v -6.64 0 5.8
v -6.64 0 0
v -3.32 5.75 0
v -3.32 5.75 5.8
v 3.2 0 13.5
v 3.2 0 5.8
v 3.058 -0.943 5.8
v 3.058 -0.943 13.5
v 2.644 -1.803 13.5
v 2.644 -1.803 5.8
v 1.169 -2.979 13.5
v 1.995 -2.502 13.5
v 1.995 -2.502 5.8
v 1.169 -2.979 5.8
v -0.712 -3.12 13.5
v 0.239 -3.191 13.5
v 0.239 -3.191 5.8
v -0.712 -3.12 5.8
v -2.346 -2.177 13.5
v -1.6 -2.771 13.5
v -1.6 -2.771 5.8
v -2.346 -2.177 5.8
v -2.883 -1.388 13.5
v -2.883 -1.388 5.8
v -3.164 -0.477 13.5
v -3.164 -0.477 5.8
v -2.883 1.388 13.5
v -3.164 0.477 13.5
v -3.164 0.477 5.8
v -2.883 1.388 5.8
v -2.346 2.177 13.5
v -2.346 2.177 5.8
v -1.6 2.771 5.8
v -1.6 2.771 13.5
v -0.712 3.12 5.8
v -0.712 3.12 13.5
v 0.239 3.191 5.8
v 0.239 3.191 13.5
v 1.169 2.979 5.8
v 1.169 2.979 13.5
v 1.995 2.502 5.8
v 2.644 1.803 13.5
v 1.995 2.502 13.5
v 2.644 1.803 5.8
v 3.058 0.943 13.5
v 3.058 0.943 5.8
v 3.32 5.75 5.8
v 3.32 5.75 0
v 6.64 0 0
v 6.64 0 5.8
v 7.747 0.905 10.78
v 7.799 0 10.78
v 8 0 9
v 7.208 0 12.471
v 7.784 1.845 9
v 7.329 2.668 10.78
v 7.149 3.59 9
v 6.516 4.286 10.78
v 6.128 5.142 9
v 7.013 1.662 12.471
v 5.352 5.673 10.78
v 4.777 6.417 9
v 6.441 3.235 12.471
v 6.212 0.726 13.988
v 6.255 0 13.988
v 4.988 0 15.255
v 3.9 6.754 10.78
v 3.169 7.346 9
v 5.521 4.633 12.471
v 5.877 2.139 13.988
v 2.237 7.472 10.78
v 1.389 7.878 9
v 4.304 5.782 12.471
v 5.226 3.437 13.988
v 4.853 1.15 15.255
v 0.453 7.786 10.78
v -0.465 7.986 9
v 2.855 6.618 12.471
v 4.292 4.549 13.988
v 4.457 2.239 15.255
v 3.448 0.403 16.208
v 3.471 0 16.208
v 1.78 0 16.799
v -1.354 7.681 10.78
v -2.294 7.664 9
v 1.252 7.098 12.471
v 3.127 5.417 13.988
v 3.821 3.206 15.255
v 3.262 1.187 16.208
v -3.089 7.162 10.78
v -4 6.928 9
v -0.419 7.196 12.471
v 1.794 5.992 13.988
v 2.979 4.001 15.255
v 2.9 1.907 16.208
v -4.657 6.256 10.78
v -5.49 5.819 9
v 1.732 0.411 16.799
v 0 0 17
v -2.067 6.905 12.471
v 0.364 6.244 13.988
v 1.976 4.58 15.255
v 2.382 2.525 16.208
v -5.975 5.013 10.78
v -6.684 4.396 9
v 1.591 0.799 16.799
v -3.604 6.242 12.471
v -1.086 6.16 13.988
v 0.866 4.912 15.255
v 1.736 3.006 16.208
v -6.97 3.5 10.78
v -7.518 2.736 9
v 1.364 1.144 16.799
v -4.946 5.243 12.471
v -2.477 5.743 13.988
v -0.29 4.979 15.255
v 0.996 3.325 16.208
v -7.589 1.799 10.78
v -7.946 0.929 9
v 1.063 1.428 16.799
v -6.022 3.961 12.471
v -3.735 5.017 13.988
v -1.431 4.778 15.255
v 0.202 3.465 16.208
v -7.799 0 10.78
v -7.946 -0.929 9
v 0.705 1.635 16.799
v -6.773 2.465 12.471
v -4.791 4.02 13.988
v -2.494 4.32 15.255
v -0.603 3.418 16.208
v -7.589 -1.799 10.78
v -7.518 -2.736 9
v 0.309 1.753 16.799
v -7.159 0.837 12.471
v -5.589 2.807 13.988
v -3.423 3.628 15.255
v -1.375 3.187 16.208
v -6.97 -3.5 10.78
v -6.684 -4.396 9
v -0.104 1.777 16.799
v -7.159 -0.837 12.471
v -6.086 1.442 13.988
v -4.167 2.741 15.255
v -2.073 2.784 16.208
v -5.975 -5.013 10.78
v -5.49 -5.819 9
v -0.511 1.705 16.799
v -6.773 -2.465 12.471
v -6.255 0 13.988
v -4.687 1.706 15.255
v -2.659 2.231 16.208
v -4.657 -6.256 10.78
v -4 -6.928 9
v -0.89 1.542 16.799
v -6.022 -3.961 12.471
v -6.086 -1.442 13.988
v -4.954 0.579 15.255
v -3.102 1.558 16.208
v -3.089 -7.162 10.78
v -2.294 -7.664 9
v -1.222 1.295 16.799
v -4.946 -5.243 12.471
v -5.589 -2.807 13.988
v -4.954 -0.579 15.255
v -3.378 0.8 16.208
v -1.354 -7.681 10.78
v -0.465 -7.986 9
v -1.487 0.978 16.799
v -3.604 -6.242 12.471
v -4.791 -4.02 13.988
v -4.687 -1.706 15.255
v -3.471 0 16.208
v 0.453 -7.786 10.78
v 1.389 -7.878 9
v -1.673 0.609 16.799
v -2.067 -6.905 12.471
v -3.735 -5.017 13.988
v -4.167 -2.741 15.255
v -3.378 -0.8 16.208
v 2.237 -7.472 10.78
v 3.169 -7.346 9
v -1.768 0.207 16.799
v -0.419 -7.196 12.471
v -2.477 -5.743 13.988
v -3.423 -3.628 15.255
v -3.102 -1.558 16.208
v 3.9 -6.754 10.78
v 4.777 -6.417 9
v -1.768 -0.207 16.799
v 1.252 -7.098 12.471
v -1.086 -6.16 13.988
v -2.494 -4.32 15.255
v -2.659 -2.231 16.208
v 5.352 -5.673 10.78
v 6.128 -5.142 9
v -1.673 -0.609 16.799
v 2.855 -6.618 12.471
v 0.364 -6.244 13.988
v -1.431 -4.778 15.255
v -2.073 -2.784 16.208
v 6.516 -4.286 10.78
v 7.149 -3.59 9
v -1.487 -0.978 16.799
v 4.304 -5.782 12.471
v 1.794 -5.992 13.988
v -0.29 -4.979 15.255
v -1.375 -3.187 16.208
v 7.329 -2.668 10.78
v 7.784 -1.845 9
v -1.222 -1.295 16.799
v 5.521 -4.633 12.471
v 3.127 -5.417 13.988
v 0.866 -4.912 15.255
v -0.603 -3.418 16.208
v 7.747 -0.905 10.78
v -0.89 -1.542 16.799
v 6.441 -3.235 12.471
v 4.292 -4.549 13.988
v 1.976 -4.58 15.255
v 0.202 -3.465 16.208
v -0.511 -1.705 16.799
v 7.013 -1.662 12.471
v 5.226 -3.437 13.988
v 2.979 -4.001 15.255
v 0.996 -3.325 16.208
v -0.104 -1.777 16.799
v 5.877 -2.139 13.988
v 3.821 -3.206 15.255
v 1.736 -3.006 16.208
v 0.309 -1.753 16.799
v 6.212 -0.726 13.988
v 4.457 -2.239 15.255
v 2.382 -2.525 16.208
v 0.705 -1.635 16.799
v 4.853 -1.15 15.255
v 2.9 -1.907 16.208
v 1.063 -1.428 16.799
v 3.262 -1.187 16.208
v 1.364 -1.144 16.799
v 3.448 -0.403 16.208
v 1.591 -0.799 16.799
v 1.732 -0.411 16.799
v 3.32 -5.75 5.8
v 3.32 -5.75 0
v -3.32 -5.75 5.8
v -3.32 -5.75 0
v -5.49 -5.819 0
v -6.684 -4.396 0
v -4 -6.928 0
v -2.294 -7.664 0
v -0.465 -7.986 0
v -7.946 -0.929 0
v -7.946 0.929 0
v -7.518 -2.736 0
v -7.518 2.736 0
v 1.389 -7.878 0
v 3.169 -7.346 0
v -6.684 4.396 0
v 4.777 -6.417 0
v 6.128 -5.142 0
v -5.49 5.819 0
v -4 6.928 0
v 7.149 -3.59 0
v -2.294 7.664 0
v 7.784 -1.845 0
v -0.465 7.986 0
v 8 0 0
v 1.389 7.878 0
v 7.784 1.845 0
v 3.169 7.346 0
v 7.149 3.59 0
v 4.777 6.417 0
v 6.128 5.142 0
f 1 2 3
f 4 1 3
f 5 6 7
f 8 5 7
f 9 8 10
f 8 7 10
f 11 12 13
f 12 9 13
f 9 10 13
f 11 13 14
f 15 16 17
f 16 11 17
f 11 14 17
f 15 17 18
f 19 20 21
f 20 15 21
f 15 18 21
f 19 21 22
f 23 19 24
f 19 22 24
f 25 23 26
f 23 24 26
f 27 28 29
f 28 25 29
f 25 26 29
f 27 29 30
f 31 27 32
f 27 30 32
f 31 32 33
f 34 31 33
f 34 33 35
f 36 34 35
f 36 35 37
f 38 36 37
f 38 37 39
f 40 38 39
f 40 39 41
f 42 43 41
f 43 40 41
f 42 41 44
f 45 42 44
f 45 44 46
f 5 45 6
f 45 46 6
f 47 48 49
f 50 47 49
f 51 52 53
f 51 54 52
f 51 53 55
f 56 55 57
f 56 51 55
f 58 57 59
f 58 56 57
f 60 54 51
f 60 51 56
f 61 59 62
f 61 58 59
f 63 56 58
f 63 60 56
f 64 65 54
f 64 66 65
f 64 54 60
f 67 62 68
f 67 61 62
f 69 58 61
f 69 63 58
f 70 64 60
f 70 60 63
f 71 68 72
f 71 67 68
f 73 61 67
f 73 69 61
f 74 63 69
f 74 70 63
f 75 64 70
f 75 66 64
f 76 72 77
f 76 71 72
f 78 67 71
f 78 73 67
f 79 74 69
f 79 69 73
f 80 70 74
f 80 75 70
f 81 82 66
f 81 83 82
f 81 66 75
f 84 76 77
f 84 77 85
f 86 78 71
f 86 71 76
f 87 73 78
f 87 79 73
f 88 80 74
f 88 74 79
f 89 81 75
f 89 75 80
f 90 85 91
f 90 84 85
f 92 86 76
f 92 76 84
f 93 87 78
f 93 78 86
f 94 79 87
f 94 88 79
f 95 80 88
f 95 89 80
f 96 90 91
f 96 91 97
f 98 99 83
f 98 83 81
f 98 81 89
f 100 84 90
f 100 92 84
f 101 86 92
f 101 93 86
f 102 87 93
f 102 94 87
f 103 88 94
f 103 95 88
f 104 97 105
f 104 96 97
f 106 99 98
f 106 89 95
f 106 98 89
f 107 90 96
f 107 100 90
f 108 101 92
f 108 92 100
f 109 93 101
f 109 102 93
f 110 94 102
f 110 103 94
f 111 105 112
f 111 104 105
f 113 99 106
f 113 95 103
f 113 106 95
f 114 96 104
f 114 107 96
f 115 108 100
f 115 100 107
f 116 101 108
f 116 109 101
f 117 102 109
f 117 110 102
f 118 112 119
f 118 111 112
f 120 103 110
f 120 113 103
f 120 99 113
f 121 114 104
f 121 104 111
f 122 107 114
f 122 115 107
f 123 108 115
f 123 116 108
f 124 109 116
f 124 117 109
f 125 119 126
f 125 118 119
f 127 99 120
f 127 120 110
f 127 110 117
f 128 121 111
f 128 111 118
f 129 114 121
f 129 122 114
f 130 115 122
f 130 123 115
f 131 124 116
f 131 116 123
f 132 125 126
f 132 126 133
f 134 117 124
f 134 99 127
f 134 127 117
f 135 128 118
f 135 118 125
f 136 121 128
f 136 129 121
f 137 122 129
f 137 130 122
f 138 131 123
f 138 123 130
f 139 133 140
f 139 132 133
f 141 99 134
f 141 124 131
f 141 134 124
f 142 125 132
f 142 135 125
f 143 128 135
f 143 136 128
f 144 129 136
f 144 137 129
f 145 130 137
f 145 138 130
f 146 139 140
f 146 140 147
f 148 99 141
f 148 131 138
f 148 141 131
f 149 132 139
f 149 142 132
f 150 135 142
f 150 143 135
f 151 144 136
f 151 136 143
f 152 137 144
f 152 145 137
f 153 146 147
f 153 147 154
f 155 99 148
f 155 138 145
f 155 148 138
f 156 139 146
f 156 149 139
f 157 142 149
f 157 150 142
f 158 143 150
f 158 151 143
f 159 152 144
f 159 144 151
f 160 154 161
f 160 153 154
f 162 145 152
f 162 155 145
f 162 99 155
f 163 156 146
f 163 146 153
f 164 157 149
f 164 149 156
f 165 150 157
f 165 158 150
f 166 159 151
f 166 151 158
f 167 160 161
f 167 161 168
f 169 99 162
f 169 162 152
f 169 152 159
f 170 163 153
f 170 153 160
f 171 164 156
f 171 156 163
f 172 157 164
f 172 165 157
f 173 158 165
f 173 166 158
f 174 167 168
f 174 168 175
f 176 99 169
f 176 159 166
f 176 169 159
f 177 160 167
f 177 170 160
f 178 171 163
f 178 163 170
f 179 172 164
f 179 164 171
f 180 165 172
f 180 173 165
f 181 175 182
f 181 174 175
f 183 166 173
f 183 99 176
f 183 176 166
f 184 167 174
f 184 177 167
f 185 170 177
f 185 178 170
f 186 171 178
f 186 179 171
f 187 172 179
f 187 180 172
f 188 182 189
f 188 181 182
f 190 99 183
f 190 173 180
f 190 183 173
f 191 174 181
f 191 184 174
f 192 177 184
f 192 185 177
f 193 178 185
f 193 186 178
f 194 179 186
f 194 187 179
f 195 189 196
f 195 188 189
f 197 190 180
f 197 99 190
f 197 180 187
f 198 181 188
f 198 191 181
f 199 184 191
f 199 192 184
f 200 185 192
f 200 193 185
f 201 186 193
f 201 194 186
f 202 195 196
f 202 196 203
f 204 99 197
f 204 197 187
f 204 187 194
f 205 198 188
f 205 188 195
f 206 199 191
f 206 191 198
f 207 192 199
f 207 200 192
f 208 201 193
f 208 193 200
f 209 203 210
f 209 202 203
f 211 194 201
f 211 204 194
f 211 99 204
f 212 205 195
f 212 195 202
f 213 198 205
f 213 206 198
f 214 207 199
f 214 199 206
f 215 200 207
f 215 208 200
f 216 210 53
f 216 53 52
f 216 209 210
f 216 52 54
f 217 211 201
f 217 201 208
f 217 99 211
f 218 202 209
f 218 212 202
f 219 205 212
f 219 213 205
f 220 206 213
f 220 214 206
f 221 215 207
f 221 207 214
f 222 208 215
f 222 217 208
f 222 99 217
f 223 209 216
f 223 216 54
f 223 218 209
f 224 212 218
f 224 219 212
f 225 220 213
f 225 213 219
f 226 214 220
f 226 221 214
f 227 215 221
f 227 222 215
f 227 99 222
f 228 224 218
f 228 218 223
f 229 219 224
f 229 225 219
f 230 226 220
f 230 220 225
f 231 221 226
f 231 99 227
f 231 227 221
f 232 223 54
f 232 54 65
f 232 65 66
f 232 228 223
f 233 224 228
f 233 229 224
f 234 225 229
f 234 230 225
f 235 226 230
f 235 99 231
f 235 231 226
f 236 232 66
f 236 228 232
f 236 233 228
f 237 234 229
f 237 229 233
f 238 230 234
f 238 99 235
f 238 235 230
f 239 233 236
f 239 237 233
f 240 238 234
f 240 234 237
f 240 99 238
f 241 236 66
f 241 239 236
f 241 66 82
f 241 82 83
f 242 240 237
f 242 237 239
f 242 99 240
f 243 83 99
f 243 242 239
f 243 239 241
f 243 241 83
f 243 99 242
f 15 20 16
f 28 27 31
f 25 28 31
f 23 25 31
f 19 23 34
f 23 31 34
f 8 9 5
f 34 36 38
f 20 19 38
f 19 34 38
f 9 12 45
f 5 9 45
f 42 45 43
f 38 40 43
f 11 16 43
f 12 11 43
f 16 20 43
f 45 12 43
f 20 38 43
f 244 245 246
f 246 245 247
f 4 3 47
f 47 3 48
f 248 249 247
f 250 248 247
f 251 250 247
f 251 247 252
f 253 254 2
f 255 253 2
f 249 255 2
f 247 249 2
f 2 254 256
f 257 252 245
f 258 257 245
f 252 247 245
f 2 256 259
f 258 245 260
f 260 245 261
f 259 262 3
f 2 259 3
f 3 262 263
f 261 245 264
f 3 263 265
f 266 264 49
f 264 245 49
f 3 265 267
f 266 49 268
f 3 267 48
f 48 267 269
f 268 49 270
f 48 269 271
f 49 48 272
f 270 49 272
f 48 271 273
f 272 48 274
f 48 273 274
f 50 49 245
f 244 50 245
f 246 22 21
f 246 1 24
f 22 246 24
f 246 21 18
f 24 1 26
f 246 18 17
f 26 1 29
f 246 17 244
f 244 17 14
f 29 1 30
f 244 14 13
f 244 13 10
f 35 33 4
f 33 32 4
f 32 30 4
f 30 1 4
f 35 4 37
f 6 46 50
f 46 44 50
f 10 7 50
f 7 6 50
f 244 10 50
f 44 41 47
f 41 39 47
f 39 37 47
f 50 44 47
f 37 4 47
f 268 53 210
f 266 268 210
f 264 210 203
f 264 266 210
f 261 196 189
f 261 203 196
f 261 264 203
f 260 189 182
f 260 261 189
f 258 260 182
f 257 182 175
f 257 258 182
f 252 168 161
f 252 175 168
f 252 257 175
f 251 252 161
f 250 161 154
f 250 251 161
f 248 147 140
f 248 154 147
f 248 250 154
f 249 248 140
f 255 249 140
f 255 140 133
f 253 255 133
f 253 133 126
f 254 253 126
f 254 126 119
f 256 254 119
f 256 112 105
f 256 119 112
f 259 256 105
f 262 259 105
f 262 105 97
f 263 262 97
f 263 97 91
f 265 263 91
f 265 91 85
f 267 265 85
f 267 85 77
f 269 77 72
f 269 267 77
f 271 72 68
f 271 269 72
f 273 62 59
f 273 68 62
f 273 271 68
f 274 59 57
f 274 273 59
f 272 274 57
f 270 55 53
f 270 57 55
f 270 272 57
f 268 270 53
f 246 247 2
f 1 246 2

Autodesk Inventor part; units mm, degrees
ref_plane "YZ Plane" through (0, 0, 0) normal (1, 0, 0) x (0, 1, 0)
ref_plane "XZ Plane" through (0, 0, 0) normal (0, 1, 0) x (-1, 0, 0)
ref_plane "XY Plane" through (0, 0, 0) normal (0, 0, 1) x (1, 0, 0)
sketch "Sketch1" plane through (0, 0, 0) normal (0, 0, 1) x (1, 0, 0)
  circle A0 centre (0, 0) radius 8
  line L0 (3.3198, 5.75) -> (6.6395, 0)
  line L1 (6.6395, 0) -> (3.3198, -5.75)
  line L2 (3.3198, -5.75) -> (-3.3198, -5.75)
  line L3 (-3.3198, -5.75) -> (-6.6395, 0)
  line L4 (-6.6395, 0) -> (-3.3198, 5.75)
  line L5 (-3.3198, 5.75) -> (3.3198, 5.75)
  circle A1 centre (0, 0) radius 3.2
  dimension "d0" = 16
  dimension "d1" = 11.5
  dimension "d2" = 6.4
extrude "Extrusion1" add sketch "Sketch1" along normal blind 17 contours A0 | L0 L1 L2 L3 L4 L5 | A1
fillet "Fillet1" radius 8 1 edges at (-8, 0, 17)
extrude "Extrusion2" cut sketch "Sketch1" along normal blind 13.5 contours A1
extrude "Extrusion3" cut sketch "Sketch1" along normal blind 5.8 contours L0 L1 L2 L3 L4 L5
properties part number "BreakerBoltCover"
